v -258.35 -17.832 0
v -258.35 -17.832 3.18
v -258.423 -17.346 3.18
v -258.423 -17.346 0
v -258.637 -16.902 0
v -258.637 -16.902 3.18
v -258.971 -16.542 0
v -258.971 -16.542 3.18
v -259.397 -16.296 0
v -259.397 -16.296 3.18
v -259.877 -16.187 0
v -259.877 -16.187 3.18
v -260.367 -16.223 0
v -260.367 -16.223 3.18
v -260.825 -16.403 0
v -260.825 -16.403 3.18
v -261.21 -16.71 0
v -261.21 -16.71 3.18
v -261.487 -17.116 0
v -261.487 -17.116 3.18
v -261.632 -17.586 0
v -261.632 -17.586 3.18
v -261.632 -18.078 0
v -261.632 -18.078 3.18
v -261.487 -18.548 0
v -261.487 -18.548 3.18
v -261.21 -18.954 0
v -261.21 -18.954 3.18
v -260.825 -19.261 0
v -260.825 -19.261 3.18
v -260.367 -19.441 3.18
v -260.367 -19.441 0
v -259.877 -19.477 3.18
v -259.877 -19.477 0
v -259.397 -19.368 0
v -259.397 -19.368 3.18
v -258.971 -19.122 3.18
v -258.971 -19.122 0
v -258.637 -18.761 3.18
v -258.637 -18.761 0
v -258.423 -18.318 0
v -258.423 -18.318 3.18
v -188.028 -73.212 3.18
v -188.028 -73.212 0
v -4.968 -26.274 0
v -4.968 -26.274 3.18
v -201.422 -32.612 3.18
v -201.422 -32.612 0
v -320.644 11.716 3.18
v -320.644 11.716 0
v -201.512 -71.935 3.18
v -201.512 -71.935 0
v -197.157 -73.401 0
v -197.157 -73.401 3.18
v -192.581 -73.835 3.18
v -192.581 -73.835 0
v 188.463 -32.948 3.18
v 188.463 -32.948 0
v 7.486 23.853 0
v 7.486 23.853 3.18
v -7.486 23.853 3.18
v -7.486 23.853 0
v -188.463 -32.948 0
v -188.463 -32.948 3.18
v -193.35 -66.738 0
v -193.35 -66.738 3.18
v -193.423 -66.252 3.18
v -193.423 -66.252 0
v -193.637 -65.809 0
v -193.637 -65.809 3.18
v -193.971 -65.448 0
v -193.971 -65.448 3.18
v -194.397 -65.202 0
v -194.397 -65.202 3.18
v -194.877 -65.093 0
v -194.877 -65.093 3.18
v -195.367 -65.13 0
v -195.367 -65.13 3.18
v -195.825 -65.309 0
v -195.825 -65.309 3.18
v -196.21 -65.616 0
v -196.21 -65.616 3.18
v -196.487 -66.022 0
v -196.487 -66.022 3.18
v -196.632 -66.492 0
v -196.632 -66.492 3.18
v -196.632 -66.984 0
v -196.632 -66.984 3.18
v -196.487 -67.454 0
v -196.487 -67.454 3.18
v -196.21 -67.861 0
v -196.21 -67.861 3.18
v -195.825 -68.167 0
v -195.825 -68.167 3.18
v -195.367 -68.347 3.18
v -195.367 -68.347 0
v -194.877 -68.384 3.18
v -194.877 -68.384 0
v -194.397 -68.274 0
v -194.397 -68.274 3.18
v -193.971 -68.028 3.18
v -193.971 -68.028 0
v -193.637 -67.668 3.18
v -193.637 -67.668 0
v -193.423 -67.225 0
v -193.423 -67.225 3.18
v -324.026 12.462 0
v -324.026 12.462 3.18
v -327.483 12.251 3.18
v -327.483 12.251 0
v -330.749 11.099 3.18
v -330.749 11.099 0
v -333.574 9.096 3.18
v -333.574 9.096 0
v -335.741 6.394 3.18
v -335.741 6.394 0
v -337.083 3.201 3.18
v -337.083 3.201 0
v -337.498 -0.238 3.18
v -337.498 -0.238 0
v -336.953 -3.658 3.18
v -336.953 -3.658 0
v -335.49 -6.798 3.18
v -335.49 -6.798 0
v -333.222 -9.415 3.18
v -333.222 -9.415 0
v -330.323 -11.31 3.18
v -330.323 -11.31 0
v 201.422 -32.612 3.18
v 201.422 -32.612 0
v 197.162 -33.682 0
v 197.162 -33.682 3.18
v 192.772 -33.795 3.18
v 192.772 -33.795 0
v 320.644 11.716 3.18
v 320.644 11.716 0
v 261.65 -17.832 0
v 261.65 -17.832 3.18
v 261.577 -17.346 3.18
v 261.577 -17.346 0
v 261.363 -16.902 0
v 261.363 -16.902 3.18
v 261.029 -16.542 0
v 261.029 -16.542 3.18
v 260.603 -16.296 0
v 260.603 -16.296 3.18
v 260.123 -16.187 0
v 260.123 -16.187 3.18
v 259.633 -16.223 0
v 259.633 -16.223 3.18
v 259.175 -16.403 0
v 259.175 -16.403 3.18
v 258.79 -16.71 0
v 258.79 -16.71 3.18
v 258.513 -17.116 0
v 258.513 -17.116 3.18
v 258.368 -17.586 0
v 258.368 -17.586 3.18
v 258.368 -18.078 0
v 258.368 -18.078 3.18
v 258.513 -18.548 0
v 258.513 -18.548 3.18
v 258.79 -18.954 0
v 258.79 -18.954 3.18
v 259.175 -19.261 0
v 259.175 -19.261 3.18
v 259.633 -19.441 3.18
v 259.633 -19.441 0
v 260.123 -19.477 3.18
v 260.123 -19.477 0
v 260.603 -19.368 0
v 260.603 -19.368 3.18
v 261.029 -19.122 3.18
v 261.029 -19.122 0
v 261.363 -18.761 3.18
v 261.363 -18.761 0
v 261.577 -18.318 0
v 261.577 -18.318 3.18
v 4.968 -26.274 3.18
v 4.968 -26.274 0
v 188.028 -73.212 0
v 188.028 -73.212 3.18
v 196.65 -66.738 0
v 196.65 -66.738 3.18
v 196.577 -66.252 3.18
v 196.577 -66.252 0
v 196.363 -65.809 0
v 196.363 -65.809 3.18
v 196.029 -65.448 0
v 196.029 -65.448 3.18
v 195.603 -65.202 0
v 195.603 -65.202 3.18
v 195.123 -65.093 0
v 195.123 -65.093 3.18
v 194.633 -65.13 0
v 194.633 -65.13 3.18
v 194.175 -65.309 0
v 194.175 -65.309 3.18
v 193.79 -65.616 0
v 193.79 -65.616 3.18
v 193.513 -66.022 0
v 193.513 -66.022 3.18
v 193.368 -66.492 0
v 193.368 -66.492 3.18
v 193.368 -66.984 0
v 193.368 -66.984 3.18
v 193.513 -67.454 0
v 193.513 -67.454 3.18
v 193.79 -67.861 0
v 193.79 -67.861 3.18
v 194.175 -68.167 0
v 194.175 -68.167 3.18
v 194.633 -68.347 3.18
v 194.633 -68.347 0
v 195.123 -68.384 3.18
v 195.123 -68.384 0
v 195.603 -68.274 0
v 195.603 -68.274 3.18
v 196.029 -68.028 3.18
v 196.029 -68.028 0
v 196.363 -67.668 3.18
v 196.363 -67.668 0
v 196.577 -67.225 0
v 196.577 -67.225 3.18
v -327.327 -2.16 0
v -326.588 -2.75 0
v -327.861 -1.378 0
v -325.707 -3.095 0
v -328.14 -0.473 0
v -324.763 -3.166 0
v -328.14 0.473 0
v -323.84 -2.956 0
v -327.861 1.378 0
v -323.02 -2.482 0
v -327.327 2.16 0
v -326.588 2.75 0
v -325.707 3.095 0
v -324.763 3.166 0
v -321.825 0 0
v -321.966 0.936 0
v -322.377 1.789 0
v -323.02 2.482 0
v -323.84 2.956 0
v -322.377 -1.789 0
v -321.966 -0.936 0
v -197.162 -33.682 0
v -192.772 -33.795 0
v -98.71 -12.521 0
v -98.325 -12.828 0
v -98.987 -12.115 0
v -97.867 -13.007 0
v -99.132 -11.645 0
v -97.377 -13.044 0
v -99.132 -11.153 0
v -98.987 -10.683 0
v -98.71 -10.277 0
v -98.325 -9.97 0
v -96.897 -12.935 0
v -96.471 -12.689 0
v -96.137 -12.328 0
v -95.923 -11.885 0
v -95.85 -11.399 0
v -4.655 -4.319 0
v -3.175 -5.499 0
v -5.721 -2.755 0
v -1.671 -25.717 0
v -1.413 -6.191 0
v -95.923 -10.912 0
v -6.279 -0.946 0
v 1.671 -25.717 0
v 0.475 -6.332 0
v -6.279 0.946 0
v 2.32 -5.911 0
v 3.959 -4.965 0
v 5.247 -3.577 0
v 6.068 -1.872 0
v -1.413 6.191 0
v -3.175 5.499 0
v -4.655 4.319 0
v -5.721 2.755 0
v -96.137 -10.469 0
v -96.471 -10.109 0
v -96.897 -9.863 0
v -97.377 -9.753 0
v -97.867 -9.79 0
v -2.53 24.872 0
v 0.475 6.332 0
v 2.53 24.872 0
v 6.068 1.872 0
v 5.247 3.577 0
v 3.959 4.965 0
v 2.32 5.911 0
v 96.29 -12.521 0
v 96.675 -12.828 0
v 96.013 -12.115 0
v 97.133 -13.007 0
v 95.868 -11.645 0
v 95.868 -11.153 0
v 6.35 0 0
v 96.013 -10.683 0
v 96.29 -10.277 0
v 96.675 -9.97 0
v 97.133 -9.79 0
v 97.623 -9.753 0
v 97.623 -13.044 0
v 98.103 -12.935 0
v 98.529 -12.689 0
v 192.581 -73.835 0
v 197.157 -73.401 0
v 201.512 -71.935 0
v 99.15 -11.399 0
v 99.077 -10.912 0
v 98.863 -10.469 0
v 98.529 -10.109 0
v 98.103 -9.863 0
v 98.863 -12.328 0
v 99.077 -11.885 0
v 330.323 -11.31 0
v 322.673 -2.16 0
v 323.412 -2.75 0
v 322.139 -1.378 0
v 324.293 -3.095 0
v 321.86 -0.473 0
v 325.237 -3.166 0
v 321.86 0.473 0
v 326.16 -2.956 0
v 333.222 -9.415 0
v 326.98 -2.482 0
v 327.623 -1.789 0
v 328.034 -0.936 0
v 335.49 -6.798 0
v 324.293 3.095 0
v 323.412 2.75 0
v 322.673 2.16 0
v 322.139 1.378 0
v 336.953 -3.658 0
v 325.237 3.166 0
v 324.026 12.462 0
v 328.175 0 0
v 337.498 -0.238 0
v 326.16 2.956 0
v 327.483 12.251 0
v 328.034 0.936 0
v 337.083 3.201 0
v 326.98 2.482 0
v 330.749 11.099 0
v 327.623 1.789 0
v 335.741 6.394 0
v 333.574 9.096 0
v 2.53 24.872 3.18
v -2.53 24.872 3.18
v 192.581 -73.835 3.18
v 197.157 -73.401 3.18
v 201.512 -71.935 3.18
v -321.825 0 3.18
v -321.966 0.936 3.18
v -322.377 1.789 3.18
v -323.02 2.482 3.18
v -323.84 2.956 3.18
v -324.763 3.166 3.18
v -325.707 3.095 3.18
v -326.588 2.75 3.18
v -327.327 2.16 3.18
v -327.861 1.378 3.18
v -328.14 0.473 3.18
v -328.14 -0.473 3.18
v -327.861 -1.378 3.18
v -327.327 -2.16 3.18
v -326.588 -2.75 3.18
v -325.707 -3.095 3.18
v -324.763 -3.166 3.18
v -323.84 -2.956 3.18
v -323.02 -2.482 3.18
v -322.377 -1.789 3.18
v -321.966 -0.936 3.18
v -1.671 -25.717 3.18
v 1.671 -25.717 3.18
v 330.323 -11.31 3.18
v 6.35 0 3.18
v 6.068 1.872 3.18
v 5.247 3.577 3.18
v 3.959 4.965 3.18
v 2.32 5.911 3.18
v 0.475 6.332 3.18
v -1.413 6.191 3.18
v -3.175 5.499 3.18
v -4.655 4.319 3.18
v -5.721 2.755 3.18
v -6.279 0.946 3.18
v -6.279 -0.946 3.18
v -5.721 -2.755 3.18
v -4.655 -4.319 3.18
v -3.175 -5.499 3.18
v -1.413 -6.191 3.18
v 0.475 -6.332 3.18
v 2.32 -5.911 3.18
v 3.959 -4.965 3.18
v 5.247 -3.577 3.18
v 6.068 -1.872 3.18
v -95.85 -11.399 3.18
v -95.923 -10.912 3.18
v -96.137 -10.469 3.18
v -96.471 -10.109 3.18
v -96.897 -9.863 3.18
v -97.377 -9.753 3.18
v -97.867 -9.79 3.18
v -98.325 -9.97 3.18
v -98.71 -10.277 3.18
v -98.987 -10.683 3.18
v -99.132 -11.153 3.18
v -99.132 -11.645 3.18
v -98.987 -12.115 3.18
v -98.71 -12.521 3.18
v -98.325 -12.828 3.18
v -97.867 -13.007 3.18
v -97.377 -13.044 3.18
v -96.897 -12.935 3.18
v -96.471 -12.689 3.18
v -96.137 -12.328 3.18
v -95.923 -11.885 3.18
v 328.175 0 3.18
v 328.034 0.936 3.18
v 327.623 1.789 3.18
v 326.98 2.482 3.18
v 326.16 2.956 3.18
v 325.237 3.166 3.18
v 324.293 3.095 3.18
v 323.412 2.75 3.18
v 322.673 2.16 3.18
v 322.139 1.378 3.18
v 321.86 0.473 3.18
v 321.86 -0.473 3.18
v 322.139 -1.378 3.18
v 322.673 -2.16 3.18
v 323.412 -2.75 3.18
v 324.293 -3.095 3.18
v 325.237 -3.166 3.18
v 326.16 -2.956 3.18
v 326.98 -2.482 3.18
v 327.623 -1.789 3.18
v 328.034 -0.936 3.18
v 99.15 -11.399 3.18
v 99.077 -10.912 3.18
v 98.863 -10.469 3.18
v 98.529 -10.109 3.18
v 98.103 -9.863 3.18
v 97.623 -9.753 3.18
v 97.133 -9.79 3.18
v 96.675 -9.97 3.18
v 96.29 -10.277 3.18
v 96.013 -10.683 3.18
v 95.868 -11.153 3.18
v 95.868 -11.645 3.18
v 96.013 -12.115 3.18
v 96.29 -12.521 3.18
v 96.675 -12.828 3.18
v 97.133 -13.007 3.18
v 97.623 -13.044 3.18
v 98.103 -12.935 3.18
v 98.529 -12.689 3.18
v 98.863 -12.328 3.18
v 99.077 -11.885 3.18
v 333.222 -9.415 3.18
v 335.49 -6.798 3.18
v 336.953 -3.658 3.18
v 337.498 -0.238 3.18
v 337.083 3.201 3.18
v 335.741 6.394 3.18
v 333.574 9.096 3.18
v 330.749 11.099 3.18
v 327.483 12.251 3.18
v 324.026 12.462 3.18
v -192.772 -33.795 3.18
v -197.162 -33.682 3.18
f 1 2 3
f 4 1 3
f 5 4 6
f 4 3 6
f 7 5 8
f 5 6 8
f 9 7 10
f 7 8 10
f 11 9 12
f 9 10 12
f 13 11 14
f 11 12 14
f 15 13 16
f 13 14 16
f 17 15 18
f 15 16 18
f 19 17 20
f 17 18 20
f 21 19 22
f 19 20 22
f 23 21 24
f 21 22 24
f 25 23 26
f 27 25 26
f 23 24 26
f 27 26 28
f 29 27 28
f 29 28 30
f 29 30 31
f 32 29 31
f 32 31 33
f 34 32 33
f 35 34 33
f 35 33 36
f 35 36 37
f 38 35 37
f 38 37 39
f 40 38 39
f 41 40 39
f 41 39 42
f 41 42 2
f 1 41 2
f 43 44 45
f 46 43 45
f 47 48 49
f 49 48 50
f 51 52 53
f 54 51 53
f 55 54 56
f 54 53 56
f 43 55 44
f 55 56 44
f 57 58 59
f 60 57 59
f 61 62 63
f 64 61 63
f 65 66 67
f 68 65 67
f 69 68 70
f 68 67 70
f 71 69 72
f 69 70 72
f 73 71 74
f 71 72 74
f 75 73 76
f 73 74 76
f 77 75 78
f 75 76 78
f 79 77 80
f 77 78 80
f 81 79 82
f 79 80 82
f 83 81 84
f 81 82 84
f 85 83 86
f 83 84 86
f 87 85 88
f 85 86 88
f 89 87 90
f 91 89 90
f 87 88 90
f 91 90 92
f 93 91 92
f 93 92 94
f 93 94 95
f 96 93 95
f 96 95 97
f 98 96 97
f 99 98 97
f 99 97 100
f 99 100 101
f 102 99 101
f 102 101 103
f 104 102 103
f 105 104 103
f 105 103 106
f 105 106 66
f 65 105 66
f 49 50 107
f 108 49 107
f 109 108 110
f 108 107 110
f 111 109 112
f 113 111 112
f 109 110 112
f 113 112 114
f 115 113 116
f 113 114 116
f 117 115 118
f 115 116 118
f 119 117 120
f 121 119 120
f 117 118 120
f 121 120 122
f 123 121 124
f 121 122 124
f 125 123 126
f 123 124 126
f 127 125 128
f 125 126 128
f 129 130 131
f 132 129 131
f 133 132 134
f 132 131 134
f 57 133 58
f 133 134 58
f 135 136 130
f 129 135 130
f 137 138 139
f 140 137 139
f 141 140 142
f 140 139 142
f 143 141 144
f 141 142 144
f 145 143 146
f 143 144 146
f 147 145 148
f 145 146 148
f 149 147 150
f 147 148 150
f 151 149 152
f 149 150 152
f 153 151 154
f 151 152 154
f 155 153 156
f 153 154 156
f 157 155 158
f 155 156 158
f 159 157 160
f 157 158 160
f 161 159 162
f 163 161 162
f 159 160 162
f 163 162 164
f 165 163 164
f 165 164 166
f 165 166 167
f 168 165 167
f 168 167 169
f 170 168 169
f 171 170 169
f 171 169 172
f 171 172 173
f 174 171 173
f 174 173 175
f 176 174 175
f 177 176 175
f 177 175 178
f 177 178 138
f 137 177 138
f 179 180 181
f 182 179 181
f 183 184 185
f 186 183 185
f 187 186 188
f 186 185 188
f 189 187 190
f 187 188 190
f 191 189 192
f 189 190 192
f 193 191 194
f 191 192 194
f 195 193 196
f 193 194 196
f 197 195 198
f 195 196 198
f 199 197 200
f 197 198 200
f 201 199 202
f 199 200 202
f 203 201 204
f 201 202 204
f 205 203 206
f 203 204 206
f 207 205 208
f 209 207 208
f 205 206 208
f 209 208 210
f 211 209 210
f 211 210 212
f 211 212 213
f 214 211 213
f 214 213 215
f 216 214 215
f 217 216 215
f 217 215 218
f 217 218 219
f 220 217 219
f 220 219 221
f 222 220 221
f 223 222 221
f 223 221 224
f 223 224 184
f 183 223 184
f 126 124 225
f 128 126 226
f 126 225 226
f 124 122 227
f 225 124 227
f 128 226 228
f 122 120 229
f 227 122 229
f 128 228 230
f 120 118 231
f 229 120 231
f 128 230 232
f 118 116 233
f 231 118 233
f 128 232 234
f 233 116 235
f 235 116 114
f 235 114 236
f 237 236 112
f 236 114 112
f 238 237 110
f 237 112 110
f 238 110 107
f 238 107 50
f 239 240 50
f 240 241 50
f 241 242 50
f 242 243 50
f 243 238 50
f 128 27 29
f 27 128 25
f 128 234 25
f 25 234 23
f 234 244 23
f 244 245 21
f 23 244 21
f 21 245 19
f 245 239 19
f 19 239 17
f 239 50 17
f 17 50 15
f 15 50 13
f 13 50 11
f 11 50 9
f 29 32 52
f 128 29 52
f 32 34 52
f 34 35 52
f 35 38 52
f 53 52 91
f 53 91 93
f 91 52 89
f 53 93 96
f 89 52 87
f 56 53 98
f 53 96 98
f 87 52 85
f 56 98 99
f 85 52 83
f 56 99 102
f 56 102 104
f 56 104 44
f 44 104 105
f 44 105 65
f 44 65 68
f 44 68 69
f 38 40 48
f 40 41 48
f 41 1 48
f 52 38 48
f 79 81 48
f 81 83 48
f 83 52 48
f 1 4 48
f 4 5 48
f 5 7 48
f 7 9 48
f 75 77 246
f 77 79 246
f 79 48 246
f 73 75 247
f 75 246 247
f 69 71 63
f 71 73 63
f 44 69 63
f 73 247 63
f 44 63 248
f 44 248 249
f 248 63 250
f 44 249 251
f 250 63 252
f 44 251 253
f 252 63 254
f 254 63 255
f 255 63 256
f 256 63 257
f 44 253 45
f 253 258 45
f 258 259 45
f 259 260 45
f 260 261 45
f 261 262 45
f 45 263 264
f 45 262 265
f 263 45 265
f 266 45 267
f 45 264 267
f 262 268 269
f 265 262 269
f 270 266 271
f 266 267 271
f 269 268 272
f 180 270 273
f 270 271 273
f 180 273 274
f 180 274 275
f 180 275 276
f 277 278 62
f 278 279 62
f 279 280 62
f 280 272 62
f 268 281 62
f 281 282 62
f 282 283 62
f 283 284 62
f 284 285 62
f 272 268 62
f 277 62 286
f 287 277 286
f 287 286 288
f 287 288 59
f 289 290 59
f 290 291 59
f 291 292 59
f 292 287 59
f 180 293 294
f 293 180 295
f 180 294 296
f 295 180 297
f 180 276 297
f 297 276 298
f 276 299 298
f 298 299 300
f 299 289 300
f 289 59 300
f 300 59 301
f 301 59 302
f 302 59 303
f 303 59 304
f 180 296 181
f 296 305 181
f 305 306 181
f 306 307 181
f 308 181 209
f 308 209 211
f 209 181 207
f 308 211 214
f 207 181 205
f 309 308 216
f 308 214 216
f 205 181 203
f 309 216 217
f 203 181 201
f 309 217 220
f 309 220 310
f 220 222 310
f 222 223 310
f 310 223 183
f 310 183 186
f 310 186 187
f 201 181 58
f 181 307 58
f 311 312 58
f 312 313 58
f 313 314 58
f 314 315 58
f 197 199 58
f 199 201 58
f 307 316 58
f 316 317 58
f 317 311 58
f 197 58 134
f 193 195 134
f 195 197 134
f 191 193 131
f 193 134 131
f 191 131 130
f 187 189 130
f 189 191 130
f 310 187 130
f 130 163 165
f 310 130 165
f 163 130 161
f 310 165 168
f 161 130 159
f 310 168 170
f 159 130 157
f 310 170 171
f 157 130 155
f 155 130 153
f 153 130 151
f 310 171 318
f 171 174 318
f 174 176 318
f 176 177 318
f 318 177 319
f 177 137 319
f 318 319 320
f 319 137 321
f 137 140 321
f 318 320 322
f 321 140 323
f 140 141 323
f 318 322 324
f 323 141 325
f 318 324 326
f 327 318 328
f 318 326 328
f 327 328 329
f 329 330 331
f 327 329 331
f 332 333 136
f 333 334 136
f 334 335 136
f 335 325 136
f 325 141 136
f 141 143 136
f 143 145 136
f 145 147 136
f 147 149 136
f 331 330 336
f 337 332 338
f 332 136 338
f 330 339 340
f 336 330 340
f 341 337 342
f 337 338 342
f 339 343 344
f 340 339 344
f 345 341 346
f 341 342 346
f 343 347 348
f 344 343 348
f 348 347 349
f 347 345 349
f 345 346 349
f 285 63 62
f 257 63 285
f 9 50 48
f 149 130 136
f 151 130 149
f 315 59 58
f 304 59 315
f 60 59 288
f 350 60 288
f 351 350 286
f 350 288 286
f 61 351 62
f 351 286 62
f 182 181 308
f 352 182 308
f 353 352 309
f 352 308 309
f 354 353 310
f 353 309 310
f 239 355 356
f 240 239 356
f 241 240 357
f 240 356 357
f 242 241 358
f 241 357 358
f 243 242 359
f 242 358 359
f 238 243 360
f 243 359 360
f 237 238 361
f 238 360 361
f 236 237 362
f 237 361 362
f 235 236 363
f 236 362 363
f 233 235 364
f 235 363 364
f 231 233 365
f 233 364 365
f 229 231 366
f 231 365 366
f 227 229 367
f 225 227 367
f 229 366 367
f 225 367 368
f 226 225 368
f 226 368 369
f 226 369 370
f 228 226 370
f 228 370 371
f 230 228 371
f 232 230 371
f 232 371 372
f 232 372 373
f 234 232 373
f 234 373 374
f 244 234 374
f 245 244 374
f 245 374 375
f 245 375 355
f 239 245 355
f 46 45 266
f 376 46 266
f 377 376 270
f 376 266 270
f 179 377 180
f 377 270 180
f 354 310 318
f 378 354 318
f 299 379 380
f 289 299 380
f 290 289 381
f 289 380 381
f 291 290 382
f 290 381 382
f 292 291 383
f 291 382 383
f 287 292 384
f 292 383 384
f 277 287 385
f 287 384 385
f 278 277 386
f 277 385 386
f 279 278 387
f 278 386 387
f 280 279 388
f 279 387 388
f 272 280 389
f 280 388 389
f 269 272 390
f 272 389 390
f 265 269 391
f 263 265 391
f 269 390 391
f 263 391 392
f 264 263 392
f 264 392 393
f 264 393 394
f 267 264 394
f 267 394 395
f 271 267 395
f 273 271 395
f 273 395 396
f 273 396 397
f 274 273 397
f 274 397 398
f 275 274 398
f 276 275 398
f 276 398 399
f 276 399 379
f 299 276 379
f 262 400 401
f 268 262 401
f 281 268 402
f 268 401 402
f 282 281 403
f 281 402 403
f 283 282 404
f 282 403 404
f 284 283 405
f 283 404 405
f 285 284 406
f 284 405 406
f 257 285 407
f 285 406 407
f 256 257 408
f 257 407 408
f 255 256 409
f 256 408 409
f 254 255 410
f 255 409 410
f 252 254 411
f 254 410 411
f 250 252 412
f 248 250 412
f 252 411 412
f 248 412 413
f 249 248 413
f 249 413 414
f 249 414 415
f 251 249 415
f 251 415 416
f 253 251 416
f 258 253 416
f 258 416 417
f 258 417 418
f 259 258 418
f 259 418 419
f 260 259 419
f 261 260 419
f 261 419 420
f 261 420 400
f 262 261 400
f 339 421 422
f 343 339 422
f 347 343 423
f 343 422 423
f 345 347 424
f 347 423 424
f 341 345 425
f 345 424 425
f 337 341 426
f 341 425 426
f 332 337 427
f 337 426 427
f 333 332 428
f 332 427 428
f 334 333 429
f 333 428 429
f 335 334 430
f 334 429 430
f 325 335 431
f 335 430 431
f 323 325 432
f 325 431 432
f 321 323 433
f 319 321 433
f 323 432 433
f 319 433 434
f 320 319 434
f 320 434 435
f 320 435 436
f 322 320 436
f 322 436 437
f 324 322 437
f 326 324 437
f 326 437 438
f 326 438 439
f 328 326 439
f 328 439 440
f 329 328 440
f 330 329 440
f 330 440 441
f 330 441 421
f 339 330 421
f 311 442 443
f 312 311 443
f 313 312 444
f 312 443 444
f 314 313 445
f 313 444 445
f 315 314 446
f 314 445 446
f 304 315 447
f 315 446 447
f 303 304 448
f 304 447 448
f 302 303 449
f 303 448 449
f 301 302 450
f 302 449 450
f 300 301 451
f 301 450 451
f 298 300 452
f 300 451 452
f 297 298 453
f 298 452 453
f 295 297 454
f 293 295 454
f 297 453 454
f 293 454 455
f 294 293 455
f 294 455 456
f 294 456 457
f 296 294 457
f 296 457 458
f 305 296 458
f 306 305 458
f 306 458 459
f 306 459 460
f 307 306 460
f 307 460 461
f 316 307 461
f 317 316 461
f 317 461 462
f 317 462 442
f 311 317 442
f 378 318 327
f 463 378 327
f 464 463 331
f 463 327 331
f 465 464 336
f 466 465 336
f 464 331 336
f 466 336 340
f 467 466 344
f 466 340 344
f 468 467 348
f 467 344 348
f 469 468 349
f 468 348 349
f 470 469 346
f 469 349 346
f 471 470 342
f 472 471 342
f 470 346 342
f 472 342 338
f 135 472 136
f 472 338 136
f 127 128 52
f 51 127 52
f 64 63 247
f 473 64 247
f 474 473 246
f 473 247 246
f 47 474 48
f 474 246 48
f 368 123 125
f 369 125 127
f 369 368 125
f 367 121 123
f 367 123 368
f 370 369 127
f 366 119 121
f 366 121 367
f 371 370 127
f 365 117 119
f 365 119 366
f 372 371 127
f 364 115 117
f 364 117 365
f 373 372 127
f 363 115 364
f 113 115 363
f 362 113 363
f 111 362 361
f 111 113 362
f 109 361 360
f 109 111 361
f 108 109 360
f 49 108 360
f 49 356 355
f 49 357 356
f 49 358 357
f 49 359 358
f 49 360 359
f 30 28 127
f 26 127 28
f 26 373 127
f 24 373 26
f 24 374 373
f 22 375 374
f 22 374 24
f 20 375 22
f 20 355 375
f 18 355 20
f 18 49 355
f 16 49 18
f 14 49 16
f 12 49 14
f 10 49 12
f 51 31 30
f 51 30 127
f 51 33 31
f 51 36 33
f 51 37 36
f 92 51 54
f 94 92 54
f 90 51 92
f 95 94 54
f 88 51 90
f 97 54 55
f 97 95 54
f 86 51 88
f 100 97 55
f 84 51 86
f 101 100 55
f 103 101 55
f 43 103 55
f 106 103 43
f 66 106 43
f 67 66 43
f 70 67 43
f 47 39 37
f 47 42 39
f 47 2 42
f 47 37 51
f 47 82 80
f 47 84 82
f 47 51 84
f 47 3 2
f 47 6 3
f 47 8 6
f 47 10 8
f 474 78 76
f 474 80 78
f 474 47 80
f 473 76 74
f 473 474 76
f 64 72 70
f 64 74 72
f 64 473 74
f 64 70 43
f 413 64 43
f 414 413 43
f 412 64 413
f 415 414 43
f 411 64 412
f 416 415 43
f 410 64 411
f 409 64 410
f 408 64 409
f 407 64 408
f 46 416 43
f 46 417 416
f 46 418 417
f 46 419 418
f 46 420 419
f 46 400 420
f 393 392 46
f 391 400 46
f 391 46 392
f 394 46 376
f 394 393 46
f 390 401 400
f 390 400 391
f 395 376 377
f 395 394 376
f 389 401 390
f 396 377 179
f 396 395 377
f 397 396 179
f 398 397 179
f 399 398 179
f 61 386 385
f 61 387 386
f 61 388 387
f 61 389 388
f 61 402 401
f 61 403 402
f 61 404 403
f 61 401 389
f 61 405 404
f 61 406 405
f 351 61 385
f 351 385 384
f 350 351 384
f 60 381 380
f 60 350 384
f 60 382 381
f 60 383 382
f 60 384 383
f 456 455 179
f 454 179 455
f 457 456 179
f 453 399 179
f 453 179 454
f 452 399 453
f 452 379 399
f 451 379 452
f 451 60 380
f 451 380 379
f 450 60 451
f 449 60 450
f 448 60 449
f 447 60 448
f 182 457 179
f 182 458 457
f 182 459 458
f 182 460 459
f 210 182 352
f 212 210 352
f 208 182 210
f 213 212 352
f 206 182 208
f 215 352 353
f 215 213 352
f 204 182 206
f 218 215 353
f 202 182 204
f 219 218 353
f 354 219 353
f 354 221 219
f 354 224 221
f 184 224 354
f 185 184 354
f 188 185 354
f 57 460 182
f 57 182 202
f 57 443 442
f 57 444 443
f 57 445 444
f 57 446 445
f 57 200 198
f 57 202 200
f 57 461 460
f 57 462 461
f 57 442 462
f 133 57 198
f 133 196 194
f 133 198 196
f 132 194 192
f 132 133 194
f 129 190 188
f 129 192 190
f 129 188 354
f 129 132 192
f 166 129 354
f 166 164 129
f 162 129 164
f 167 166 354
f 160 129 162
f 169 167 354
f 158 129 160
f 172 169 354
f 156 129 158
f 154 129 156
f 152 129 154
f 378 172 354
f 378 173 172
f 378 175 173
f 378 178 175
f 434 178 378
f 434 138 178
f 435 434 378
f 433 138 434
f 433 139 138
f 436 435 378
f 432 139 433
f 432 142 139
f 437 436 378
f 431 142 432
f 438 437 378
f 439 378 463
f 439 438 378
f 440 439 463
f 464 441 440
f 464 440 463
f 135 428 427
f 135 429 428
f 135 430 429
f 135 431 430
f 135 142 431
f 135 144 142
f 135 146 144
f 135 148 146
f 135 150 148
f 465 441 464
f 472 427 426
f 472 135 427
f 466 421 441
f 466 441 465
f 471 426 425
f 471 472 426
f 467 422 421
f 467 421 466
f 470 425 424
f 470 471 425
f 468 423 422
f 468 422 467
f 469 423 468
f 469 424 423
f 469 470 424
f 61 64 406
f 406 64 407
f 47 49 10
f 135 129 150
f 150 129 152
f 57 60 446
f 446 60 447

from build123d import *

# Parameters (mm, degrees)
BOSS_EXTRUDE1_DEPTH = 3.18
SKETCH2_R           = 6.35
SKETCH2_R_2         = 3.175
SKETCH2_R_3         = 1.65
CUT_EXTRUDE1_DEPTH  = 4.18


with BuildPart() as part:
    # Sketch1 → Boss-Extrude1 (new body)
    with BuildSketch(Plane.XY):
        with BuildLine():
            Line((-7.486391976, 23.852755295), (-188.46282125, -32.948250341))
            ThreePointArc((-188.46282125, -32.948250341), (-194.970418947, -33.859324331), (-201.422047732, -32.612179737))
            Line((-201.422047732, -32.612179737), (-320.643679437, 11.71633352))
            ThreePointArc((-320.643679437, 11.71633352), (-336.523287364, 4.843949662), (-330.323051891, -11.309956612))
            Line((-330.323051891, -11.309956612), (-201.512349729, -71.934950616))
            ThreePointArc((-201.512349729, -71.934950616), (-194.881579427, -73.749885885), (-188.027959697, -73.212297358))
            Line((-188.027959697, -73.212297358), (-4.967507005, -26.273719745))
            ThreePointArc((-4.967507005, -26.273719745), (0, -25.646997066), (4.967507005, -26.273719745))
            Line((4.967507005, -26.273719745), (188.027959697, -73.212297358))
            ThreePointArc((188.027959697, -73.212297358), (194.881579427, -73.749885885), (201.512349729, -71.934950616))
            Line((201.512349729, -71.934950616), (330.323051891, -11.309956612))
            ThreePointArc((330.323051891, -11.309956612), (336.523287364, 4.843949662), (320.643679437, 11.71633352))
            Line((320.643679437, 11.71633352), (201.422047732, -32.612179737))
            ThreePointArc((201.422047732, -32.612179737), (194.970418947, -33.859324331), (188.46282125, -32.948250341))
            Line((188.46282125, -32.948250341), (7.486391976, 23.852755295))
            ThreePointArc((7.486391976, 23.852755295), (0, 25), (-7.486391976, 23.852755295))
        make_face()
    extrude(amount=BOSS_EXTRUDE1_DEPTH)

    # Sketch2 → Cut-Extrude1 (cut, through all)
    with BuildSketch(Plane.XY.offset(3.18)):
        Circle(SKETCH2_R)
        with Locations((-325, 0)):
            Circle(SKETCH2_R_2)
        with Locations((-97.5, -11.398788164)):
            Circle(SKETCH2_R_3)
        with Locations((-195, -66.738312644)):
            Circle(SKETCH2_R_3)
        with Locations((-260, -17.831958341)):
            Circle(SKETCH2_R_3)
        with Locations((97.5, -11.398788164)):
            Circle(SKETCH2_R_3)
        with Locations((195, -66.738312644)):
            Circle(SKETCH2_R_3)
        with Locations((260, -17.831958341)):
            Circle(SKETCH2_R_3)
        with Locations((325, 0)):
            Circle(SKETCH2_R_2)
    extrude(amount=-CUT_EXTRUDE1_DEPTH, mode=Mode.SUBTRACT)


solid = part.part
